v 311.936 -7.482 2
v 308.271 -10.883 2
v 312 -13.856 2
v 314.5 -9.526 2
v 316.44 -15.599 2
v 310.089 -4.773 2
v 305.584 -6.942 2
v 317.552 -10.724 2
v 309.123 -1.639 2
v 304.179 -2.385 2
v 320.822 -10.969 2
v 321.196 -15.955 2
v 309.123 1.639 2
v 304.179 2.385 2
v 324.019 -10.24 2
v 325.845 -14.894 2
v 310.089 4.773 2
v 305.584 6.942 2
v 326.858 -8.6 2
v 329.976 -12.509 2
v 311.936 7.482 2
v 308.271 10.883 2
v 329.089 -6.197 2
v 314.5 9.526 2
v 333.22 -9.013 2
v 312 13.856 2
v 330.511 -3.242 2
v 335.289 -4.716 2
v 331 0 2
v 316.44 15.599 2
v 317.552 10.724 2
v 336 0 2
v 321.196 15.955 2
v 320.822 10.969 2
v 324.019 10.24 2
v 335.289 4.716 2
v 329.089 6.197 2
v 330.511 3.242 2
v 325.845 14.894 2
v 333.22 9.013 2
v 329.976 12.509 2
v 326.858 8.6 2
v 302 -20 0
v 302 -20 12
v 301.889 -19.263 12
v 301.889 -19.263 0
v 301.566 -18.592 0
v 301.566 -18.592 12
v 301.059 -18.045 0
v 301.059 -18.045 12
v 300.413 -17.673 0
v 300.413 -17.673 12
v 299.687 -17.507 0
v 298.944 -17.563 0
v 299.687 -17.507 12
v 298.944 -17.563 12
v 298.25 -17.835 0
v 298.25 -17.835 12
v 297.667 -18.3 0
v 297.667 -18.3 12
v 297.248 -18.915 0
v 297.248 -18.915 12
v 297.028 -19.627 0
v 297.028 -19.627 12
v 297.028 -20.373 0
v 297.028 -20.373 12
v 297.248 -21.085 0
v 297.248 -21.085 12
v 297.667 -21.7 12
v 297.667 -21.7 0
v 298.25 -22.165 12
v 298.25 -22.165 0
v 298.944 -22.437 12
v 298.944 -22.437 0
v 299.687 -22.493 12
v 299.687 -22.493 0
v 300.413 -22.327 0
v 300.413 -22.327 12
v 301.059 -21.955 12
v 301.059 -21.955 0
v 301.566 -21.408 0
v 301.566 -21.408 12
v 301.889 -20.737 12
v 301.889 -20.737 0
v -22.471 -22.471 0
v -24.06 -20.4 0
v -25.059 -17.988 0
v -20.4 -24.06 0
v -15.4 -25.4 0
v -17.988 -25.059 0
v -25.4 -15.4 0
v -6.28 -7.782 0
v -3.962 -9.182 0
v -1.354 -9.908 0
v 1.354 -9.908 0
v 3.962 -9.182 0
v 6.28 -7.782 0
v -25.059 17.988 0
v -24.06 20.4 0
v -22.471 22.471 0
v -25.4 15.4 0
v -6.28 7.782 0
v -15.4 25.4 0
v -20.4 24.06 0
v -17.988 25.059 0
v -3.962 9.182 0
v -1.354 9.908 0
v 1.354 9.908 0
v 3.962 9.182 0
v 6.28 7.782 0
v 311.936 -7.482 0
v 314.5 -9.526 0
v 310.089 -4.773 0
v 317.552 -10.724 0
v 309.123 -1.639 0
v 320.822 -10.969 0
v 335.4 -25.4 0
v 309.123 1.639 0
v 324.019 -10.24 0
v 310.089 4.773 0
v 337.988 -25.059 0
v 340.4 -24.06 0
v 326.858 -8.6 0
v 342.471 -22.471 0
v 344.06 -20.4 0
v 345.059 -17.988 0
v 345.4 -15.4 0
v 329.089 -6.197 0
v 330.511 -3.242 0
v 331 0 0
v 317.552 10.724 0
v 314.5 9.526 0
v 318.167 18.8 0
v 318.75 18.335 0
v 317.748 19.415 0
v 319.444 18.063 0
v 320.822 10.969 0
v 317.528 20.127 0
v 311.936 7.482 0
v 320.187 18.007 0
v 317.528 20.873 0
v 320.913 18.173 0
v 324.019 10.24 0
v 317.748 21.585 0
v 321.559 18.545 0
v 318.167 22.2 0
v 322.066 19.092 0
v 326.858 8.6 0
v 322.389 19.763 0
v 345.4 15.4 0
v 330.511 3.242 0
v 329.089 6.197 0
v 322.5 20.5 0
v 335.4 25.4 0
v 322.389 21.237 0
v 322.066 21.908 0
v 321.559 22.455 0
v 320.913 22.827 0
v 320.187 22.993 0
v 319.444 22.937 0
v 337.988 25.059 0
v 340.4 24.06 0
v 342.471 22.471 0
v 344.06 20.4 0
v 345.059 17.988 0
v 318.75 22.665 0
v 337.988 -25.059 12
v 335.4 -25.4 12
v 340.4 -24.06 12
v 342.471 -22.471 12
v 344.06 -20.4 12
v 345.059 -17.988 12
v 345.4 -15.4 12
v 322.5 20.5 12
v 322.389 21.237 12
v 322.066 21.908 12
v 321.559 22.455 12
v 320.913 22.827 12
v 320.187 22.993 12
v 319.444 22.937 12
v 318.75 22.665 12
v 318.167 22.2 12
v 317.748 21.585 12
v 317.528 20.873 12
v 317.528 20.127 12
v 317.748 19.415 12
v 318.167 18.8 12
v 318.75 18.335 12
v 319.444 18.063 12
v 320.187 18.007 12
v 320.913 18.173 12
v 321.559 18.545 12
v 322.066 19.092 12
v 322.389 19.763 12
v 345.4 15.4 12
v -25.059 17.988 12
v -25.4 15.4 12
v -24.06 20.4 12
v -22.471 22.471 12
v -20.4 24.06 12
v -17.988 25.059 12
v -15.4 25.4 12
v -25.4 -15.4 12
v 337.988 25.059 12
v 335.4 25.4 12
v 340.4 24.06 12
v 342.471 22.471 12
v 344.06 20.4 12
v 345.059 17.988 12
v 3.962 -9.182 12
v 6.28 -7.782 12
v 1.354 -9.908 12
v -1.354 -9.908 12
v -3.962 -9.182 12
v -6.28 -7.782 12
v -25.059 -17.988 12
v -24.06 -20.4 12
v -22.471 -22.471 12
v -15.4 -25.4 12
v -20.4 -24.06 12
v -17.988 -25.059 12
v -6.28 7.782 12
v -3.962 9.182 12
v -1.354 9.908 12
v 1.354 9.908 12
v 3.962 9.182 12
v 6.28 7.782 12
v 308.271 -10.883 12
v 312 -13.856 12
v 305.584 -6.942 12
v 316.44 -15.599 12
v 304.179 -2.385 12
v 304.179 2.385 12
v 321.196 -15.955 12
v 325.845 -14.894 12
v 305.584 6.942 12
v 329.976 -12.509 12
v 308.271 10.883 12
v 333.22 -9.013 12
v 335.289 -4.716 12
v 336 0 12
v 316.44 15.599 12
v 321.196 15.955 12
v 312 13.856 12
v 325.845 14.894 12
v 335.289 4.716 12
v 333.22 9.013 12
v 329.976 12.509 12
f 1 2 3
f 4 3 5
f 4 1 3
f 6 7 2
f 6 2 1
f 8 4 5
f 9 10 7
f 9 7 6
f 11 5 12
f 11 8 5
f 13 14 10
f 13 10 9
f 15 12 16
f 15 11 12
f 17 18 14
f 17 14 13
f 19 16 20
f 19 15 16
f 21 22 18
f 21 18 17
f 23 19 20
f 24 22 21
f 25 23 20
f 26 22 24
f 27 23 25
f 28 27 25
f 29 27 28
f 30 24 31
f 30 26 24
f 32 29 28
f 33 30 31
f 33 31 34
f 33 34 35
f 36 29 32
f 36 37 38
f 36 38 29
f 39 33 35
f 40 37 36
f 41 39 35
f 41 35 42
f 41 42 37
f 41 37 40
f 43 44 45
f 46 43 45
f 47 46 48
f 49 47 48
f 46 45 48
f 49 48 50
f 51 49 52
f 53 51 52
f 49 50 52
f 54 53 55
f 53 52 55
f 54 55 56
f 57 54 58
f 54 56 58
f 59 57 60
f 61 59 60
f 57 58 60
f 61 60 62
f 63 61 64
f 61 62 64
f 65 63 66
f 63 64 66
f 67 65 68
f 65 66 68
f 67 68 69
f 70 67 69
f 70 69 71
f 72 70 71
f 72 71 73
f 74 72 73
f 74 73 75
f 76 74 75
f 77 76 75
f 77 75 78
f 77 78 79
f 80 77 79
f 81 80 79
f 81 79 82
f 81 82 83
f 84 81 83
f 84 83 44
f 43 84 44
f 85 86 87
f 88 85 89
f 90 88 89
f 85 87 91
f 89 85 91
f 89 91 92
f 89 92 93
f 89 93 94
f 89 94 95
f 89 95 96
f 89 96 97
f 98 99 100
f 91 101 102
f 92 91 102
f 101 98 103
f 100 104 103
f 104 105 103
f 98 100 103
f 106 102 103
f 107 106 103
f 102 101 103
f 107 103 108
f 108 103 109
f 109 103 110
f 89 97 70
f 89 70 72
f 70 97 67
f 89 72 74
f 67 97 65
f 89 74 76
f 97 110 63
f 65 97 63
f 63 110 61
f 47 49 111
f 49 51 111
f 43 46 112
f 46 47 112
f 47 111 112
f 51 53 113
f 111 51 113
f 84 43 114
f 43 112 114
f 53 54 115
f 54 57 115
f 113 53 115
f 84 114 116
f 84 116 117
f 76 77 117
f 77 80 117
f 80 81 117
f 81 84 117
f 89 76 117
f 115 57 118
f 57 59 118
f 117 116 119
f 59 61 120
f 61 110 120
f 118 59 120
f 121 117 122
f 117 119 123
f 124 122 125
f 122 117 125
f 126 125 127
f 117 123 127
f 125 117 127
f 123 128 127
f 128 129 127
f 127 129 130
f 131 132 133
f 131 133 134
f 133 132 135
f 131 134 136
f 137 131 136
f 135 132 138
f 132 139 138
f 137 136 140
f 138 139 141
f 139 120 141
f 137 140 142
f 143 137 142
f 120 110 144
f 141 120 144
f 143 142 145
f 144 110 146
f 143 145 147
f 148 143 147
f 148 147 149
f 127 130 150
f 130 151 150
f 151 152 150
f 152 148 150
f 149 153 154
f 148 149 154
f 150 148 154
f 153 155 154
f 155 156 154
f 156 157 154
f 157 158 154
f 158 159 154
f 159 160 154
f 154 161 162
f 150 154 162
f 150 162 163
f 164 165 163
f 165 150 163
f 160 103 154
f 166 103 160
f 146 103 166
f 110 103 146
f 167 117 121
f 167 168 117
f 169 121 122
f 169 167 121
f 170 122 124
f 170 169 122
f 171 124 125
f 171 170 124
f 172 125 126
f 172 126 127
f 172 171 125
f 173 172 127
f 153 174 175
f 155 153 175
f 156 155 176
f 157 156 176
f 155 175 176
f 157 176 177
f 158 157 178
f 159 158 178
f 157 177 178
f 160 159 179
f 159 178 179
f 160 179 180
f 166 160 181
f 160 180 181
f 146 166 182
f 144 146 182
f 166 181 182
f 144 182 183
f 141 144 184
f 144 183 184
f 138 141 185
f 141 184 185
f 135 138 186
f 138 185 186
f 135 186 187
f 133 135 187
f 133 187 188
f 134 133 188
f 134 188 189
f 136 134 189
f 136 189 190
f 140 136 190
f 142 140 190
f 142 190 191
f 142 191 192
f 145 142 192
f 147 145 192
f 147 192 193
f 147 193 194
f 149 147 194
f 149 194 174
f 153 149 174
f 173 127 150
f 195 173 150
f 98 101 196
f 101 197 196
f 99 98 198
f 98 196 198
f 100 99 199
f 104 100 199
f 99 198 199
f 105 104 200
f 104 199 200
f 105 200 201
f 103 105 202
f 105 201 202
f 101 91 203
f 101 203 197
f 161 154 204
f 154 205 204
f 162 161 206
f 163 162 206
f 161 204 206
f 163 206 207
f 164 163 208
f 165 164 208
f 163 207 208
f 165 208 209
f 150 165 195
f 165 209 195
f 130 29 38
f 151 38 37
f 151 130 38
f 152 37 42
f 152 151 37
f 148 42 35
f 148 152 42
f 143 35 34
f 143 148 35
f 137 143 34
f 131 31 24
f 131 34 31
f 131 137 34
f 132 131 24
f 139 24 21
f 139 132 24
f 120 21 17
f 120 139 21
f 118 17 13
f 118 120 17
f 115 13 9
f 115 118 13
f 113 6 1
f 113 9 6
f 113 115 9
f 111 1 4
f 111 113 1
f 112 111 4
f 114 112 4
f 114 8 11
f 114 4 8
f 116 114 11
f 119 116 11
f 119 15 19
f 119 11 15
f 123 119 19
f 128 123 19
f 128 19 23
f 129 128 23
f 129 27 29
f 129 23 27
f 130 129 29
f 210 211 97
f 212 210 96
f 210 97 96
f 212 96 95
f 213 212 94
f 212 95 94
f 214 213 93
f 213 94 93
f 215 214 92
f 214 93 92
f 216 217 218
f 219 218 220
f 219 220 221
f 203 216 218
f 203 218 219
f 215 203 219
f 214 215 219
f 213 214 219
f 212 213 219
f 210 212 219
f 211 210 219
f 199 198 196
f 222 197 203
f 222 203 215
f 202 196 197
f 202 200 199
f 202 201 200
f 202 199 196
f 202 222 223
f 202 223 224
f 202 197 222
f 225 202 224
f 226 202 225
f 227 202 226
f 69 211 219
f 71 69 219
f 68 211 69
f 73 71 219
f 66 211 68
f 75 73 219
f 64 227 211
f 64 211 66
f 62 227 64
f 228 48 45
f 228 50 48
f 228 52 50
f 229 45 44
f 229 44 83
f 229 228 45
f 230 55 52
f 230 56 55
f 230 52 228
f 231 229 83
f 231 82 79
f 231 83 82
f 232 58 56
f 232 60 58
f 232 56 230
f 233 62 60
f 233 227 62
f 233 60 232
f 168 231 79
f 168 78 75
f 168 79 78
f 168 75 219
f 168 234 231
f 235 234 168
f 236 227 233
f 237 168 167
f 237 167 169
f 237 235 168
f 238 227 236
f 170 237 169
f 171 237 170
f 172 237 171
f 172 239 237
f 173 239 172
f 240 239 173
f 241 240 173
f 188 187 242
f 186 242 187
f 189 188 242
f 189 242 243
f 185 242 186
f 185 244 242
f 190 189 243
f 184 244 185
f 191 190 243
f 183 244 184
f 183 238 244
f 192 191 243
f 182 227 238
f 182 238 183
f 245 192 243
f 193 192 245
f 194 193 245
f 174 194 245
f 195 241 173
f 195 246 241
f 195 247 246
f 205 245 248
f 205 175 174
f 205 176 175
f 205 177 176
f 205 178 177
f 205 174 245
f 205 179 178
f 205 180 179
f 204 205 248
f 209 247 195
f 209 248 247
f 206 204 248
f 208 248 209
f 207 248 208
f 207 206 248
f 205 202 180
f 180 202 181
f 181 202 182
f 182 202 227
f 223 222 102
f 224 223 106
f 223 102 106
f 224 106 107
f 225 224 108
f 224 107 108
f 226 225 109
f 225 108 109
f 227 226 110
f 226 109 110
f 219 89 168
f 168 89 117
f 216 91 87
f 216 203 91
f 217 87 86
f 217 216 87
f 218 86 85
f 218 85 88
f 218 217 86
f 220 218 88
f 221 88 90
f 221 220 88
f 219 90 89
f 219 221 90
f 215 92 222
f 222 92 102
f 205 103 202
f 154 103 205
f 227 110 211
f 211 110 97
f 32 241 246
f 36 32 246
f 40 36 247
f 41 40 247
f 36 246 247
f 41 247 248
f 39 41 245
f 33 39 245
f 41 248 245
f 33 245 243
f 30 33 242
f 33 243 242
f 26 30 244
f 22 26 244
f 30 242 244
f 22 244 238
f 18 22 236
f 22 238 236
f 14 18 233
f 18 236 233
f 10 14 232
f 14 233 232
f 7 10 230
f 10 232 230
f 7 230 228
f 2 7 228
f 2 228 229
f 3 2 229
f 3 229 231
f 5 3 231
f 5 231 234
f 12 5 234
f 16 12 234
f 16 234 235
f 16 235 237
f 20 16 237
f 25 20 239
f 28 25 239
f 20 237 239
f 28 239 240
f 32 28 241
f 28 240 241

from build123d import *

# Parameters (mm, degrees)
CROQUIS1_W              = 370.8
CROQUIS1_H              = 50.8
CROQUIS1_R              = 11
SALIENTE_EXTRUIR1_DEPTH = 12
REDONDEO1_R             = 10
CROQUIS4_R              = 16
CORTAR_EXTRUIR3_DEPTH   = 10
CROQUIS6_R              = 2.5
CORTAR_EXTRUIR4_DEPTH   = 347.540502683


with BuildPart() as part:
    # Croquis1 → Saliente-Extruir1 (new body)
    with BuildSketch(Plane.XY):
        with Locations((160, 0)):
            Rectangle(CROQUIS1_W, CROQUIS1_H)
        with Locations((320, 0)):
            Circle(CROQUIS1_R, mode=Mode.SUBTRACT)
        with BuildLine():
            Line((-6.28, -7.782133384), (-6.28, 7.782133384))
            ThreePointArc((-6.28, 7.782133384), (0, 10), (6.28, 7.782133384))
            Line((6.28, 7.782133384), (6.28, -7.782133384))
            ThreePointArc((6.28, -7.782133384), (0, -10), (-6.28, -7.782133384))
        make_face(mode=Mode.SUBTRACT)
    extrude(amount=SALIENTE_EXTRUIR1_DEPTH)

    # Redondeo1
    redondeo1_edges = [part.edges().sort_by_distance(p)[0] for p in [
        (-25.4, 25.4, 6),
        (345.4, 25.4, 6),
        (345.4, -25.4, 6),
        (-25.4, -25.4, 6),
    ]]
    fillet(redondeo1_edges, radius=REDONDEO1_R)

    # Croquis4 → Cortar-Extruir3 (cut)
    with BuildSketch(Plane.XY.offset(12)):
        with Locations((320, 0)):
            Circle(CROQUIS4_R)
    extrude(amount=-CORTAR_EXTRUIR3_DEPTH, mode=Mode.SUBTRACT)

    # Croquis6 → Cortar-Extruir4 (cut, through all)
    with BuildSketch(Plane.XY.offset(12)):
        with Locations((320, 20.5)):
            Circle(CROQUIS6_R)
        with Locations((360.5, 0)):
            Circle(CROQUIS6_R)
        with Locations((340, -40.5)):
            Circle(CROQUIS6_R)
        with Locations((299.5, -20)):
            Circle(CROQUIS6_R)
    extrude(amount=-CORTAR_EXTRUIR4_DEPTH, mode=Mode.SUBTRACT)


solid = part.part
